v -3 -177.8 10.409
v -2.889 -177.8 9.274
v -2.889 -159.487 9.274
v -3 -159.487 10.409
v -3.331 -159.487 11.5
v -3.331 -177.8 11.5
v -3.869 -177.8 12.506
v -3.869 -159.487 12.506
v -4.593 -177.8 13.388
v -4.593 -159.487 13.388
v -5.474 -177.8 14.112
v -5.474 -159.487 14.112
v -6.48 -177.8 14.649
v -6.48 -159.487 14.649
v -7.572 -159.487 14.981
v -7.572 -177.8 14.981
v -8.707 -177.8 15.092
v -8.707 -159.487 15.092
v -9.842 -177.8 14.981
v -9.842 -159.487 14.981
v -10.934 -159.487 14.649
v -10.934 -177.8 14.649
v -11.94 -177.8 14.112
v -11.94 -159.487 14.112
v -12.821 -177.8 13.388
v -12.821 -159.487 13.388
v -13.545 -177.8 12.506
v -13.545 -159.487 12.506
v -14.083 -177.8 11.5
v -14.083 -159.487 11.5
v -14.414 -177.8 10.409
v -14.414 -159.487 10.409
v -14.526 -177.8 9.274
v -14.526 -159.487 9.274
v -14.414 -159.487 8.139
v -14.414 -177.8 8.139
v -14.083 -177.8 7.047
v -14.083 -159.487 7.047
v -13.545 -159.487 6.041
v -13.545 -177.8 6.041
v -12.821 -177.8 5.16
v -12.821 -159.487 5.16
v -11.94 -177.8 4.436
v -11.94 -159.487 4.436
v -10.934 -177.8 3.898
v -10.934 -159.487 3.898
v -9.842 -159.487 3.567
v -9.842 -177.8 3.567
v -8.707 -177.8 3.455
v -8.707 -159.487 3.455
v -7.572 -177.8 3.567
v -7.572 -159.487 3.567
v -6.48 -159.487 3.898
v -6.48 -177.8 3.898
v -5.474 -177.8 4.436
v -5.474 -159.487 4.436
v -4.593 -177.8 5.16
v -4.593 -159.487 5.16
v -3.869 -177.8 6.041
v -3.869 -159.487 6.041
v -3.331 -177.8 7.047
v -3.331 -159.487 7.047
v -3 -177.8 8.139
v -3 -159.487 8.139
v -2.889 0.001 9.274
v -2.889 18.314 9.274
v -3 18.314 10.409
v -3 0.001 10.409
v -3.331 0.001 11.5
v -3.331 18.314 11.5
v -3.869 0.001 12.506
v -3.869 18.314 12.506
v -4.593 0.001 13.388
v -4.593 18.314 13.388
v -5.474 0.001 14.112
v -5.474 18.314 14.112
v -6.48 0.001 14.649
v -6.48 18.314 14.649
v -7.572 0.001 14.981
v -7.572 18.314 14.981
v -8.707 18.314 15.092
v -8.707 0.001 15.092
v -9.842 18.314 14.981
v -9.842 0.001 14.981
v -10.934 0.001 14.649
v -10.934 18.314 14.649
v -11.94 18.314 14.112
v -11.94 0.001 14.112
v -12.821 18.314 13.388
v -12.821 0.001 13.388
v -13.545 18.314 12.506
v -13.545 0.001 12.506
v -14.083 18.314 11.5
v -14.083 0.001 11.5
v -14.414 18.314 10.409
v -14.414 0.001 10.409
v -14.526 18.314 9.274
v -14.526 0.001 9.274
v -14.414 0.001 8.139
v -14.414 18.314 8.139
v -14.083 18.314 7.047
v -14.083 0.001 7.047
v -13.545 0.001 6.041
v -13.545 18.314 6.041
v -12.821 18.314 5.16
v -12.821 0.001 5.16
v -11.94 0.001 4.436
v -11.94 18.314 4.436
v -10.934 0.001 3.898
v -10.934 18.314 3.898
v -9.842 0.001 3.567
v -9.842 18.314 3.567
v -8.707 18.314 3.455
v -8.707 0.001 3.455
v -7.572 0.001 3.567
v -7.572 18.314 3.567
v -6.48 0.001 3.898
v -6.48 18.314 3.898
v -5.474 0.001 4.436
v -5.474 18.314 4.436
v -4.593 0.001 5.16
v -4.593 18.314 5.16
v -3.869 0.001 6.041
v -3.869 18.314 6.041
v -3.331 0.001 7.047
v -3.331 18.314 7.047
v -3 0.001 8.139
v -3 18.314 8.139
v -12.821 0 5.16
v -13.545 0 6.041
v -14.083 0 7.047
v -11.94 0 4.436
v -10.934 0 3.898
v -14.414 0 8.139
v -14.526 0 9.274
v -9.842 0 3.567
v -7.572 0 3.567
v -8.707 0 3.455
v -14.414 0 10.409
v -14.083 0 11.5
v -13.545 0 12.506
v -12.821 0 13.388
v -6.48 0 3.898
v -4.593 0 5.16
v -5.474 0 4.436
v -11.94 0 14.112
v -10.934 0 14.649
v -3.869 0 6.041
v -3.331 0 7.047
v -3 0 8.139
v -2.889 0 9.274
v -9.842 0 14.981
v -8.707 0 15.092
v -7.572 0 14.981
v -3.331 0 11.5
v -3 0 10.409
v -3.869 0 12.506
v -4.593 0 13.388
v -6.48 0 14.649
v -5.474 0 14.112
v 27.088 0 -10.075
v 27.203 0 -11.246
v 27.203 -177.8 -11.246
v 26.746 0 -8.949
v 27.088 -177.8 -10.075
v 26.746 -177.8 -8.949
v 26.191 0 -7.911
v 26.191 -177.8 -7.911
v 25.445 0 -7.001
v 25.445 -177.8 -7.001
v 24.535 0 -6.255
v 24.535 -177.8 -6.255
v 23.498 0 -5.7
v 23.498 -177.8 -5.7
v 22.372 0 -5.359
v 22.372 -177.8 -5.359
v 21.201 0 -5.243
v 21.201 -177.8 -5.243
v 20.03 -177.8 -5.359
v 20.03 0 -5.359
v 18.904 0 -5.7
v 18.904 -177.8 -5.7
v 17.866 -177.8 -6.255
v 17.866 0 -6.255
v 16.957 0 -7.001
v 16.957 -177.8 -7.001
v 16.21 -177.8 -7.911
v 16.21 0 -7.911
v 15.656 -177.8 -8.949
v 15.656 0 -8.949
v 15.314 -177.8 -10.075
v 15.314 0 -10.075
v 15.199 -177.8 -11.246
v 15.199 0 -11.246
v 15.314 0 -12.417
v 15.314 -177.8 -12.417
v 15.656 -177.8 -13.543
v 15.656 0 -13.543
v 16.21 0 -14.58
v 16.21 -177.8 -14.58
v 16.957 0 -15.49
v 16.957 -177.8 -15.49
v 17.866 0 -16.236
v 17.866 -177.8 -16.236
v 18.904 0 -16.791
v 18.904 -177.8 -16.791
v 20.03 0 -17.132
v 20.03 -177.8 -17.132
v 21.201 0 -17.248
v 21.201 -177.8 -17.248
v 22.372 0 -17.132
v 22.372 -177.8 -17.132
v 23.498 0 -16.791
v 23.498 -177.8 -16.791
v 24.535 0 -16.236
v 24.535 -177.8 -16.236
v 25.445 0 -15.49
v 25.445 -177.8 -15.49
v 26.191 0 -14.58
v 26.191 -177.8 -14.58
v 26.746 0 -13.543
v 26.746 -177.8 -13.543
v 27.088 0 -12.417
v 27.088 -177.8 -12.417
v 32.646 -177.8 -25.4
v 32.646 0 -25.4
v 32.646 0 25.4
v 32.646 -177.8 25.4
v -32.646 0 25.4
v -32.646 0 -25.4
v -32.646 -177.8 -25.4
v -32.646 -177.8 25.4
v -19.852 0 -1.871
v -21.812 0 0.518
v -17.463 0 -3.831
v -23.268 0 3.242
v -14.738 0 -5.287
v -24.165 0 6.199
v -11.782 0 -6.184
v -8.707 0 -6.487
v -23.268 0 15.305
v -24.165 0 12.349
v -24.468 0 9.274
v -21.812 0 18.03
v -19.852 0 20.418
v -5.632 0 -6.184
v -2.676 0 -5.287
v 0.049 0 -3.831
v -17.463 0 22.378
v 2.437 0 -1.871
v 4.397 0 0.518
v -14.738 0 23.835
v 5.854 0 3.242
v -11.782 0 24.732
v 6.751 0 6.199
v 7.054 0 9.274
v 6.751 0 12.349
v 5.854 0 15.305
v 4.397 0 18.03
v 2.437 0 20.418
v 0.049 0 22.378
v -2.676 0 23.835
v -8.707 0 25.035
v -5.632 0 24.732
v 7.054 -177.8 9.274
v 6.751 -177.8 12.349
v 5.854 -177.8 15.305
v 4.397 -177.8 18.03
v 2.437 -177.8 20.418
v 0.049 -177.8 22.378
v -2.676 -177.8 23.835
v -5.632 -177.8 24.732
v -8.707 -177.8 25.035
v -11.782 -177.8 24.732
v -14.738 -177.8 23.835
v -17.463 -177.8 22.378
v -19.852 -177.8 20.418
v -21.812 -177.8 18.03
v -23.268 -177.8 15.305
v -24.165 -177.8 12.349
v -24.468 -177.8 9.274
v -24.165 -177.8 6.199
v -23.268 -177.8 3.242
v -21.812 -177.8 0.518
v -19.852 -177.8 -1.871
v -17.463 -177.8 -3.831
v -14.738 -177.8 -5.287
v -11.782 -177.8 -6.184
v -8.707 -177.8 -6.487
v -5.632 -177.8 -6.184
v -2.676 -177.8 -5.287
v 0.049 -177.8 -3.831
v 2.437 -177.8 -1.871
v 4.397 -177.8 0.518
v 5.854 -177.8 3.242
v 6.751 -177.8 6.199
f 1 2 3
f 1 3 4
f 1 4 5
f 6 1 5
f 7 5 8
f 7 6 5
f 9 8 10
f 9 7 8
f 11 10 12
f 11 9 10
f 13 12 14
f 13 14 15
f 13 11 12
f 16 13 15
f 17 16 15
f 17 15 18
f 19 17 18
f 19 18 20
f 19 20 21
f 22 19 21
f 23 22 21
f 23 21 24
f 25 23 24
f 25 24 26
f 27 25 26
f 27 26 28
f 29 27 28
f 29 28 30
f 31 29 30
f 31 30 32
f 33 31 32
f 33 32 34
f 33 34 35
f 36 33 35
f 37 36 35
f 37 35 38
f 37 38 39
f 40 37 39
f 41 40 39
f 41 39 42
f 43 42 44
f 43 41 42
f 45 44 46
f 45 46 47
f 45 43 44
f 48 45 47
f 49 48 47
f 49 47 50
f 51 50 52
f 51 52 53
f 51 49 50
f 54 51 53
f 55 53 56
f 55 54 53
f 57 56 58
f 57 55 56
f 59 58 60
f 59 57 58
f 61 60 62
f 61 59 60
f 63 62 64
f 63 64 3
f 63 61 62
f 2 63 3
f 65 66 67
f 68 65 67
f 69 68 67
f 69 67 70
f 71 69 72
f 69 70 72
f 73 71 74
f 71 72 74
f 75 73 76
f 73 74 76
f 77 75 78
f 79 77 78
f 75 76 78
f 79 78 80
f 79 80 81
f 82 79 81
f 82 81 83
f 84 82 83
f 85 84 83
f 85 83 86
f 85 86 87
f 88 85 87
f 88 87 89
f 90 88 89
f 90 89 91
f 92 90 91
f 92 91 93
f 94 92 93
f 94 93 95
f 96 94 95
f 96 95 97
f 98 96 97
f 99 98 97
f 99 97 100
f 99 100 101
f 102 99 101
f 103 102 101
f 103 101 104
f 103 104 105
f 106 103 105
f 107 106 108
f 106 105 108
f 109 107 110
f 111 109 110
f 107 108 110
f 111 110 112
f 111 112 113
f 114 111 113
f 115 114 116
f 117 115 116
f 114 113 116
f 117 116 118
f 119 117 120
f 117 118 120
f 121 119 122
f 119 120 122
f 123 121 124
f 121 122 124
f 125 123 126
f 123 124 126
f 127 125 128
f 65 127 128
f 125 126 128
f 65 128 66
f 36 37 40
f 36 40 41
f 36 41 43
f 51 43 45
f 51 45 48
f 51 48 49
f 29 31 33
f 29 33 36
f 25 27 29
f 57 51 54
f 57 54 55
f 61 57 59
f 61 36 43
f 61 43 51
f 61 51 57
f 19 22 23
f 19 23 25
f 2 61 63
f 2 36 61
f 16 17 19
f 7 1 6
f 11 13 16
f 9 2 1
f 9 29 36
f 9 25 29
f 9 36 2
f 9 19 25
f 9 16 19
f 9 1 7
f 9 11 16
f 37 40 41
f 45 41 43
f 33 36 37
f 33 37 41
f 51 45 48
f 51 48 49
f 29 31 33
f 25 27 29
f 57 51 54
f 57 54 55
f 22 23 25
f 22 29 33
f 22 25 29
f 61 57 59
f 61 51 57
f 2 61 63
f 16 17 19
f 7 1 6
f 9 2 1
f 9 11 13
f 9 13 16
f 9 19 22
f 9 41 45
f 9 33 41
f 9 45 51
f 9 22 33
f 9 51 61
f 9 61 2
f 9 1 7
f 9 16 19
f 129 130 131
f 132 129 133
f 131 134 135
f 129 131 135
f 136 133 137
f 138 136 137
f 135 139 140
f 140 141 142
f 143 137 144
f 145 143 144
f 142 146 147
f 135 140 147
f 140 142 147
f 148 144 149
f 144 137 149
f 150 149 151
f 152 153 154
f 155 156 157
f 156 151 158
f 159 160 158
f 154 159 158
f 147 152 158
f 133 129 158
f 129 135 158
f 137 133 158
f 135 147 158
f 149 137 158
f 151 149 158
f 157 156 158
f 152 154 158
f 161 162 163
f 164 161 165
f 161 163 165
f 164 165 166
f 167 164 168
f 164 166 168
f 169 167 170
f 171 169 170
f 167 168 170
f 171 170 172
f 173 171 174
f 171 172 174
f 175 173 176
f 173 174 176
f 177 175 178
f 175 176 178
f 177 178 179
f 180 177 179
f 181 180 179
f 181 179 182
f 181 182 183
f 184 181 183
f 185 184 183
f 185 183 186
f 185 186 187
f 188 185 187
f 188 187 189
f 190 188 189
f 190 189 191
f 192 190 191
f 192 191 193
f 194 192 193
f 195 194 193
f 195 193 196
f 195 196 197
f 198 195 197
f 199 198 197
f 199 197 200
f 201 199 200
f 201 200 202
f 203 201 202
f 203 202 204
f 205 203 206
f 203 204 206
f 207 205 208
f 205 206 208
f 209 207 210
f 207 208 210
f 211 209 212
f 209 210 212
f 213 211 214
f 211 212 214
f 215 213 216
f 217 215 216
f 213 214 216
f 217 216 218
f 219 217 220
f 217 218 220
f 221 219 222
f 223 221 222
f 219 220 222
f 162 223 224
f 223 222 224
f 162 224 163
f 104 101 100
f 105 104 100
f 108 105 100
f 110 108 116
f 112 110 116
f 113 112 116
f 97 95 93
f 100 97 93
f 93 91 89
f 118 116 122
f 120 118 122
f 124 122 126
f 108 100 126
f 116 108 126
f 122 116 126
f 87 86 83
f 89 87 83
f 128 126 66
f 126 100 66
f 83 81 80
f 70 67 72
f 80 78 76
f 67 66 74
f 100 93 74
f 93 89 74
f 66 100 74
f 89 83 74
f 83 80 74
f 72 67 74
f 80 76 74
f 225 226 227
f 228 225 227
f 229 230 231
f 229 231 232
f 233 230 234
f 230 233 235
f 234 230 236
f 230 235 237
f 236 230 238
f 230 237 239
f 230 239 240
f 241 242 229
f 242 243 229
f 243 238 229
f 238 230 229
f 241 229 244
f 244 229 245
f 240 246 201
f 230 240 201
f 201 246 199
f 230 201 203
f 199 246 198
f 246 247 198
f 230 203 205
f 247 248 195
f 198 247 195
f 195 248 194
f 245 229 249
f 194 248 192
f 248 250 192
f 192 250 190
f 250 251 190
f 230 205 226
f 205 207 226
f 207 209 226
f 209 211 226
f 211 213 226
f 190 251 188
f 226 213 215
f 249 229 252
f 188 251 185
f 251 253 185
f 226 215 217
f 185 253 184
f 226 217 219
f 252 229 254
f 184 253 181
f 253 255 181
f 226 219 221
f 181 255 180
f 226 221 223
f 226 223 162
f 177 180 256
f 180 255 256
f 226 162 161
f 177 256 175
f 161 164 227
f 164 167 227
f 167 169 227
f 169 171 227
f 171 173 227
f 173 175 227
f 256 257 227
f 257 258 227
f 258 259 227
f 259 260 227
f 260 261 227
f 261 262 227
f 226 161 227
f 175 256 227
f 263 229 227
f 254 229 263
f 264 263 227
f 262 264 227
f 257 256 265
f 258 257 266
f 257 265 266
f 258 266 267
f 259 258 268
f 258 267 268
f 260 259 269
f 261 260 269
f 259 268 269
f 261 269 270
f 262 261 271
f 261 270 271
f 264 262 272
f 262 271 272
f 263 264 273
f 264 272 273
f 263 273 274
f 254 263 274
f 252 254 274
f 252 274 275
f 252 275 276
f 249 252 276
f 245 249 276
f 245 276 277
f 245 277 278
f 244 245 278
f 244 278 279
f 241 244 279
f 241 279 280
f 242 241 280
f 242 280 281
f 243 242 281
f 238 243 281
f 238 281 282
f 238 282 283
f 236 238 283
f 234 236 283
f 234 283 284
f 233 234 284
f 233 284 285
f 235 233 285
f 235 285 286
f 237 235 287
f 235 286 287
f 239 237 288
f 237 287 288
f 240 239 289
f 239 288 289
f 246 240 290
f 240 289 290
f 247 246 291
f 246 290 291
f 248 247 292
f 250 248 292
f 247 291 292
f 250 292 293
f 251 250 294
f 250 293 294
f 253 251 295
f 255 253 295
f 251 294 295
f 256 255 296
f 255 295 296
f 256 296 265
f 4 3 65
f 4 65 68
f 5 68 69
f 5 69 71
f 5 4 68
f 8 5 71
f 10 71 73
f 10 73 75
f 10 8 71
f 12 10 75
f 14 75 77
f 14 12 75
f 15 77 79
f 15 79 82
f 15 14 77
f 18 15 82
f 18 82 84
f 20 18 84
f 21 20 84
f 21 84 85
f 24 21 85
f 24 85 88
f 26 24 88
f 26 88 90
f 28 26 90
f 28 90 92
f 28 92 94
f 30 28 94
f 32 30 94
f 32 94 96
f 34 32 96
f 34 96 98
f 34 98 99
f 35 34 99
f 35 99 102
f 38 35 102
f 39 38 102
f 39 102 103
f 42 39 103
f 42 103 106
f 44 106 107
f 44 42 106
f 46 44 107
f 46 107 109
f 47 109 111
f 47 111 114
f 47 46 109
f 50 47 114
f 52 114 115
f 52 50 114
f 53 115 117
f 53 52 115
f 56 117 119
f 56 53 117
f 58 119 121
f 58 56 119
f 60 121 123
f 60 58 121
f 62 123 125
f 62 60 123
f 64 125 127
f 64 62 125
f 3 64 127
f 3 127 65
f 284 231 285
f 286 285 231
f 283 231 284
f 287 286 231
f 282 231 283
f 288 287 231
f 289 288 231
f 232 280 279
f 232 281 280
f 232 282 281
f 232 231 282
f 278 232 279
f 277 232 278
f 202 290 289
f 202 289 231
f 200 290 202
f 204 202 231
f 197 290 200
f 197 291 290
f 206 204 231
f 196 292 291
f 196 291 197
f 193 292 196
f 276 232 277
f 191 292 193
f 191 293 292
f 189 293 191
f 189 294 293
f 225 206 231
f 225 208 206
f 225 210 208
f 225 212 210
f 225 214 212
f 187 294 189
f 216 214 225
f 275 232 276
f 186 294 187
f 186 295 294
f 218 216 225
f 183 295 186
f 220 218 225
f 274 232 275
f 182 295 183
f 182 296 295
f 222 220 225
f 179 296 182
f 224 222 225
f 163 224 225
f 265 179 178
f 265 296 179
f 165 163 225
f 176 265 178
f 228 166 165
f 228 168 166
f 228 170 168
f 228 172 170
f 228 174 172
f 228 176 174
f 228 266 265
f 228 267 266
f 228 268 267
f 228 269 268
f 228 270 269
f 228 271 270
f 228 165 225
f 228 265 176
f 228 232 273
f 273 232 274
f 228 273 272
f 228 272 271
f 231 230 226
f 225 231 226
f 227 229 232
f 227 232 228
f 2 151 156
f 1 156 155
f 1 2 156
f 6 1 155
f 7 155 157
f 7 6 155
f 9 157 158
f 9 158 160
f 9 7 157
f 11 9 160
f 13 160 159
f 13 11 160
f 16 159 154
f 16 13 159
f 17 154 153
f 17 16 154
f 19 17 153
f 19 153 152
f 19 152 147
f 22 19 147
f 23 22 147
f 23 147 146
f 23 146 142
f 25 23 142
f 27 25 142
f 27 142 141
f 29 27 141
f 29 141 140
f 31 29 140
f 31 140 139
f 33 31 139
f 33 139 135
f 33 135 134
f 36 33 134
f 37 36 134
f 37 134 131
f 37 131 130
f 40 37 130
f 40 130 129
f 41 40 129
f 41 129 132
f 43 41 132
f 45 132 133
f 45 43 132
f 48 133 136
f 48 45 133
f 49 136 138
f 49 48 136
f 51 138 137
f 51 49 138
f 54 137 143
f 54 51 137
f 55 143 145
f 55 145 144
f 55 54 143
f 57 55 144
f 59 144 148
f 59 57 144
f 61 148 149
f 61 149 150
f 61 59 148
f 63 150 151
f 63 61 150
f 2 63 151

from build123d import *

# Parameters (mm, degrees)
F0_W     = 65.2924329042
F0_H     = 50.8008524776
F0_W_2   = 20.2902685851
F0_H_2   = 12.3683428392
F1_DEPTH = 177.8
F2_R     = 5.8184975352
F3_DEPTH = 177.801
F2_R_2   = 15.7606877534
F2_R_3   = 6.0021596397
F4_DEPTH = 196.114718


# Not quite as in the source:
# - a pattern or mirror of a feature is missing from the dataset's text; its kind, count and spacing are read off the source's solid


with BuildPart() as f1:
    # F0 (on Front) → F1 (new body)
    with BuildSketch(Plane.XZ):
        Rectangle(F0_W, F0_H)
        Rectangle(F0_W_2, F0_H_2, mode=Mode.SUBTRACT)
        Rectangle(F0_W_2, F0_H_2)
    extrude(amount=F1_DEPTH)

    # F2 (on face) → F4 (cut, through all)
    with BuildSketch(Plane.XZ.offset(177.8)):
        with Locations((-8.707053028, 9.2738447711)):
            Circle(F2_R_2)
        with Locations((-8.707053028, 9.2738447711)):
            Circle(F2_R, mode=Mode.SUBTRACT)
        with Locations((21.2008059025, -11.2456455827)):
            Circle(F2_R_3)
    extrude(amount=-F4_DEPTH, mode=Mode.SUBTRACT)


with BuildPart() as f3:
    # F2 (on face) → F3 (new body, through all)
    with BuildSketch(Plane.XZ.offset(177.8)):
        with Locations((-8.707053028, 9.2738447711)):
            Circle(F2_R)
    extrude(amount=-F3_DEPTH)

    # F3_copies: F3 across plane


with BuildPart() as f3_1:
    add(f3.part)
    add(f3.part.mirror(Plane.ZX.offset(-79.743141)))


solid = Compound([f1.part, f3_1.part])
